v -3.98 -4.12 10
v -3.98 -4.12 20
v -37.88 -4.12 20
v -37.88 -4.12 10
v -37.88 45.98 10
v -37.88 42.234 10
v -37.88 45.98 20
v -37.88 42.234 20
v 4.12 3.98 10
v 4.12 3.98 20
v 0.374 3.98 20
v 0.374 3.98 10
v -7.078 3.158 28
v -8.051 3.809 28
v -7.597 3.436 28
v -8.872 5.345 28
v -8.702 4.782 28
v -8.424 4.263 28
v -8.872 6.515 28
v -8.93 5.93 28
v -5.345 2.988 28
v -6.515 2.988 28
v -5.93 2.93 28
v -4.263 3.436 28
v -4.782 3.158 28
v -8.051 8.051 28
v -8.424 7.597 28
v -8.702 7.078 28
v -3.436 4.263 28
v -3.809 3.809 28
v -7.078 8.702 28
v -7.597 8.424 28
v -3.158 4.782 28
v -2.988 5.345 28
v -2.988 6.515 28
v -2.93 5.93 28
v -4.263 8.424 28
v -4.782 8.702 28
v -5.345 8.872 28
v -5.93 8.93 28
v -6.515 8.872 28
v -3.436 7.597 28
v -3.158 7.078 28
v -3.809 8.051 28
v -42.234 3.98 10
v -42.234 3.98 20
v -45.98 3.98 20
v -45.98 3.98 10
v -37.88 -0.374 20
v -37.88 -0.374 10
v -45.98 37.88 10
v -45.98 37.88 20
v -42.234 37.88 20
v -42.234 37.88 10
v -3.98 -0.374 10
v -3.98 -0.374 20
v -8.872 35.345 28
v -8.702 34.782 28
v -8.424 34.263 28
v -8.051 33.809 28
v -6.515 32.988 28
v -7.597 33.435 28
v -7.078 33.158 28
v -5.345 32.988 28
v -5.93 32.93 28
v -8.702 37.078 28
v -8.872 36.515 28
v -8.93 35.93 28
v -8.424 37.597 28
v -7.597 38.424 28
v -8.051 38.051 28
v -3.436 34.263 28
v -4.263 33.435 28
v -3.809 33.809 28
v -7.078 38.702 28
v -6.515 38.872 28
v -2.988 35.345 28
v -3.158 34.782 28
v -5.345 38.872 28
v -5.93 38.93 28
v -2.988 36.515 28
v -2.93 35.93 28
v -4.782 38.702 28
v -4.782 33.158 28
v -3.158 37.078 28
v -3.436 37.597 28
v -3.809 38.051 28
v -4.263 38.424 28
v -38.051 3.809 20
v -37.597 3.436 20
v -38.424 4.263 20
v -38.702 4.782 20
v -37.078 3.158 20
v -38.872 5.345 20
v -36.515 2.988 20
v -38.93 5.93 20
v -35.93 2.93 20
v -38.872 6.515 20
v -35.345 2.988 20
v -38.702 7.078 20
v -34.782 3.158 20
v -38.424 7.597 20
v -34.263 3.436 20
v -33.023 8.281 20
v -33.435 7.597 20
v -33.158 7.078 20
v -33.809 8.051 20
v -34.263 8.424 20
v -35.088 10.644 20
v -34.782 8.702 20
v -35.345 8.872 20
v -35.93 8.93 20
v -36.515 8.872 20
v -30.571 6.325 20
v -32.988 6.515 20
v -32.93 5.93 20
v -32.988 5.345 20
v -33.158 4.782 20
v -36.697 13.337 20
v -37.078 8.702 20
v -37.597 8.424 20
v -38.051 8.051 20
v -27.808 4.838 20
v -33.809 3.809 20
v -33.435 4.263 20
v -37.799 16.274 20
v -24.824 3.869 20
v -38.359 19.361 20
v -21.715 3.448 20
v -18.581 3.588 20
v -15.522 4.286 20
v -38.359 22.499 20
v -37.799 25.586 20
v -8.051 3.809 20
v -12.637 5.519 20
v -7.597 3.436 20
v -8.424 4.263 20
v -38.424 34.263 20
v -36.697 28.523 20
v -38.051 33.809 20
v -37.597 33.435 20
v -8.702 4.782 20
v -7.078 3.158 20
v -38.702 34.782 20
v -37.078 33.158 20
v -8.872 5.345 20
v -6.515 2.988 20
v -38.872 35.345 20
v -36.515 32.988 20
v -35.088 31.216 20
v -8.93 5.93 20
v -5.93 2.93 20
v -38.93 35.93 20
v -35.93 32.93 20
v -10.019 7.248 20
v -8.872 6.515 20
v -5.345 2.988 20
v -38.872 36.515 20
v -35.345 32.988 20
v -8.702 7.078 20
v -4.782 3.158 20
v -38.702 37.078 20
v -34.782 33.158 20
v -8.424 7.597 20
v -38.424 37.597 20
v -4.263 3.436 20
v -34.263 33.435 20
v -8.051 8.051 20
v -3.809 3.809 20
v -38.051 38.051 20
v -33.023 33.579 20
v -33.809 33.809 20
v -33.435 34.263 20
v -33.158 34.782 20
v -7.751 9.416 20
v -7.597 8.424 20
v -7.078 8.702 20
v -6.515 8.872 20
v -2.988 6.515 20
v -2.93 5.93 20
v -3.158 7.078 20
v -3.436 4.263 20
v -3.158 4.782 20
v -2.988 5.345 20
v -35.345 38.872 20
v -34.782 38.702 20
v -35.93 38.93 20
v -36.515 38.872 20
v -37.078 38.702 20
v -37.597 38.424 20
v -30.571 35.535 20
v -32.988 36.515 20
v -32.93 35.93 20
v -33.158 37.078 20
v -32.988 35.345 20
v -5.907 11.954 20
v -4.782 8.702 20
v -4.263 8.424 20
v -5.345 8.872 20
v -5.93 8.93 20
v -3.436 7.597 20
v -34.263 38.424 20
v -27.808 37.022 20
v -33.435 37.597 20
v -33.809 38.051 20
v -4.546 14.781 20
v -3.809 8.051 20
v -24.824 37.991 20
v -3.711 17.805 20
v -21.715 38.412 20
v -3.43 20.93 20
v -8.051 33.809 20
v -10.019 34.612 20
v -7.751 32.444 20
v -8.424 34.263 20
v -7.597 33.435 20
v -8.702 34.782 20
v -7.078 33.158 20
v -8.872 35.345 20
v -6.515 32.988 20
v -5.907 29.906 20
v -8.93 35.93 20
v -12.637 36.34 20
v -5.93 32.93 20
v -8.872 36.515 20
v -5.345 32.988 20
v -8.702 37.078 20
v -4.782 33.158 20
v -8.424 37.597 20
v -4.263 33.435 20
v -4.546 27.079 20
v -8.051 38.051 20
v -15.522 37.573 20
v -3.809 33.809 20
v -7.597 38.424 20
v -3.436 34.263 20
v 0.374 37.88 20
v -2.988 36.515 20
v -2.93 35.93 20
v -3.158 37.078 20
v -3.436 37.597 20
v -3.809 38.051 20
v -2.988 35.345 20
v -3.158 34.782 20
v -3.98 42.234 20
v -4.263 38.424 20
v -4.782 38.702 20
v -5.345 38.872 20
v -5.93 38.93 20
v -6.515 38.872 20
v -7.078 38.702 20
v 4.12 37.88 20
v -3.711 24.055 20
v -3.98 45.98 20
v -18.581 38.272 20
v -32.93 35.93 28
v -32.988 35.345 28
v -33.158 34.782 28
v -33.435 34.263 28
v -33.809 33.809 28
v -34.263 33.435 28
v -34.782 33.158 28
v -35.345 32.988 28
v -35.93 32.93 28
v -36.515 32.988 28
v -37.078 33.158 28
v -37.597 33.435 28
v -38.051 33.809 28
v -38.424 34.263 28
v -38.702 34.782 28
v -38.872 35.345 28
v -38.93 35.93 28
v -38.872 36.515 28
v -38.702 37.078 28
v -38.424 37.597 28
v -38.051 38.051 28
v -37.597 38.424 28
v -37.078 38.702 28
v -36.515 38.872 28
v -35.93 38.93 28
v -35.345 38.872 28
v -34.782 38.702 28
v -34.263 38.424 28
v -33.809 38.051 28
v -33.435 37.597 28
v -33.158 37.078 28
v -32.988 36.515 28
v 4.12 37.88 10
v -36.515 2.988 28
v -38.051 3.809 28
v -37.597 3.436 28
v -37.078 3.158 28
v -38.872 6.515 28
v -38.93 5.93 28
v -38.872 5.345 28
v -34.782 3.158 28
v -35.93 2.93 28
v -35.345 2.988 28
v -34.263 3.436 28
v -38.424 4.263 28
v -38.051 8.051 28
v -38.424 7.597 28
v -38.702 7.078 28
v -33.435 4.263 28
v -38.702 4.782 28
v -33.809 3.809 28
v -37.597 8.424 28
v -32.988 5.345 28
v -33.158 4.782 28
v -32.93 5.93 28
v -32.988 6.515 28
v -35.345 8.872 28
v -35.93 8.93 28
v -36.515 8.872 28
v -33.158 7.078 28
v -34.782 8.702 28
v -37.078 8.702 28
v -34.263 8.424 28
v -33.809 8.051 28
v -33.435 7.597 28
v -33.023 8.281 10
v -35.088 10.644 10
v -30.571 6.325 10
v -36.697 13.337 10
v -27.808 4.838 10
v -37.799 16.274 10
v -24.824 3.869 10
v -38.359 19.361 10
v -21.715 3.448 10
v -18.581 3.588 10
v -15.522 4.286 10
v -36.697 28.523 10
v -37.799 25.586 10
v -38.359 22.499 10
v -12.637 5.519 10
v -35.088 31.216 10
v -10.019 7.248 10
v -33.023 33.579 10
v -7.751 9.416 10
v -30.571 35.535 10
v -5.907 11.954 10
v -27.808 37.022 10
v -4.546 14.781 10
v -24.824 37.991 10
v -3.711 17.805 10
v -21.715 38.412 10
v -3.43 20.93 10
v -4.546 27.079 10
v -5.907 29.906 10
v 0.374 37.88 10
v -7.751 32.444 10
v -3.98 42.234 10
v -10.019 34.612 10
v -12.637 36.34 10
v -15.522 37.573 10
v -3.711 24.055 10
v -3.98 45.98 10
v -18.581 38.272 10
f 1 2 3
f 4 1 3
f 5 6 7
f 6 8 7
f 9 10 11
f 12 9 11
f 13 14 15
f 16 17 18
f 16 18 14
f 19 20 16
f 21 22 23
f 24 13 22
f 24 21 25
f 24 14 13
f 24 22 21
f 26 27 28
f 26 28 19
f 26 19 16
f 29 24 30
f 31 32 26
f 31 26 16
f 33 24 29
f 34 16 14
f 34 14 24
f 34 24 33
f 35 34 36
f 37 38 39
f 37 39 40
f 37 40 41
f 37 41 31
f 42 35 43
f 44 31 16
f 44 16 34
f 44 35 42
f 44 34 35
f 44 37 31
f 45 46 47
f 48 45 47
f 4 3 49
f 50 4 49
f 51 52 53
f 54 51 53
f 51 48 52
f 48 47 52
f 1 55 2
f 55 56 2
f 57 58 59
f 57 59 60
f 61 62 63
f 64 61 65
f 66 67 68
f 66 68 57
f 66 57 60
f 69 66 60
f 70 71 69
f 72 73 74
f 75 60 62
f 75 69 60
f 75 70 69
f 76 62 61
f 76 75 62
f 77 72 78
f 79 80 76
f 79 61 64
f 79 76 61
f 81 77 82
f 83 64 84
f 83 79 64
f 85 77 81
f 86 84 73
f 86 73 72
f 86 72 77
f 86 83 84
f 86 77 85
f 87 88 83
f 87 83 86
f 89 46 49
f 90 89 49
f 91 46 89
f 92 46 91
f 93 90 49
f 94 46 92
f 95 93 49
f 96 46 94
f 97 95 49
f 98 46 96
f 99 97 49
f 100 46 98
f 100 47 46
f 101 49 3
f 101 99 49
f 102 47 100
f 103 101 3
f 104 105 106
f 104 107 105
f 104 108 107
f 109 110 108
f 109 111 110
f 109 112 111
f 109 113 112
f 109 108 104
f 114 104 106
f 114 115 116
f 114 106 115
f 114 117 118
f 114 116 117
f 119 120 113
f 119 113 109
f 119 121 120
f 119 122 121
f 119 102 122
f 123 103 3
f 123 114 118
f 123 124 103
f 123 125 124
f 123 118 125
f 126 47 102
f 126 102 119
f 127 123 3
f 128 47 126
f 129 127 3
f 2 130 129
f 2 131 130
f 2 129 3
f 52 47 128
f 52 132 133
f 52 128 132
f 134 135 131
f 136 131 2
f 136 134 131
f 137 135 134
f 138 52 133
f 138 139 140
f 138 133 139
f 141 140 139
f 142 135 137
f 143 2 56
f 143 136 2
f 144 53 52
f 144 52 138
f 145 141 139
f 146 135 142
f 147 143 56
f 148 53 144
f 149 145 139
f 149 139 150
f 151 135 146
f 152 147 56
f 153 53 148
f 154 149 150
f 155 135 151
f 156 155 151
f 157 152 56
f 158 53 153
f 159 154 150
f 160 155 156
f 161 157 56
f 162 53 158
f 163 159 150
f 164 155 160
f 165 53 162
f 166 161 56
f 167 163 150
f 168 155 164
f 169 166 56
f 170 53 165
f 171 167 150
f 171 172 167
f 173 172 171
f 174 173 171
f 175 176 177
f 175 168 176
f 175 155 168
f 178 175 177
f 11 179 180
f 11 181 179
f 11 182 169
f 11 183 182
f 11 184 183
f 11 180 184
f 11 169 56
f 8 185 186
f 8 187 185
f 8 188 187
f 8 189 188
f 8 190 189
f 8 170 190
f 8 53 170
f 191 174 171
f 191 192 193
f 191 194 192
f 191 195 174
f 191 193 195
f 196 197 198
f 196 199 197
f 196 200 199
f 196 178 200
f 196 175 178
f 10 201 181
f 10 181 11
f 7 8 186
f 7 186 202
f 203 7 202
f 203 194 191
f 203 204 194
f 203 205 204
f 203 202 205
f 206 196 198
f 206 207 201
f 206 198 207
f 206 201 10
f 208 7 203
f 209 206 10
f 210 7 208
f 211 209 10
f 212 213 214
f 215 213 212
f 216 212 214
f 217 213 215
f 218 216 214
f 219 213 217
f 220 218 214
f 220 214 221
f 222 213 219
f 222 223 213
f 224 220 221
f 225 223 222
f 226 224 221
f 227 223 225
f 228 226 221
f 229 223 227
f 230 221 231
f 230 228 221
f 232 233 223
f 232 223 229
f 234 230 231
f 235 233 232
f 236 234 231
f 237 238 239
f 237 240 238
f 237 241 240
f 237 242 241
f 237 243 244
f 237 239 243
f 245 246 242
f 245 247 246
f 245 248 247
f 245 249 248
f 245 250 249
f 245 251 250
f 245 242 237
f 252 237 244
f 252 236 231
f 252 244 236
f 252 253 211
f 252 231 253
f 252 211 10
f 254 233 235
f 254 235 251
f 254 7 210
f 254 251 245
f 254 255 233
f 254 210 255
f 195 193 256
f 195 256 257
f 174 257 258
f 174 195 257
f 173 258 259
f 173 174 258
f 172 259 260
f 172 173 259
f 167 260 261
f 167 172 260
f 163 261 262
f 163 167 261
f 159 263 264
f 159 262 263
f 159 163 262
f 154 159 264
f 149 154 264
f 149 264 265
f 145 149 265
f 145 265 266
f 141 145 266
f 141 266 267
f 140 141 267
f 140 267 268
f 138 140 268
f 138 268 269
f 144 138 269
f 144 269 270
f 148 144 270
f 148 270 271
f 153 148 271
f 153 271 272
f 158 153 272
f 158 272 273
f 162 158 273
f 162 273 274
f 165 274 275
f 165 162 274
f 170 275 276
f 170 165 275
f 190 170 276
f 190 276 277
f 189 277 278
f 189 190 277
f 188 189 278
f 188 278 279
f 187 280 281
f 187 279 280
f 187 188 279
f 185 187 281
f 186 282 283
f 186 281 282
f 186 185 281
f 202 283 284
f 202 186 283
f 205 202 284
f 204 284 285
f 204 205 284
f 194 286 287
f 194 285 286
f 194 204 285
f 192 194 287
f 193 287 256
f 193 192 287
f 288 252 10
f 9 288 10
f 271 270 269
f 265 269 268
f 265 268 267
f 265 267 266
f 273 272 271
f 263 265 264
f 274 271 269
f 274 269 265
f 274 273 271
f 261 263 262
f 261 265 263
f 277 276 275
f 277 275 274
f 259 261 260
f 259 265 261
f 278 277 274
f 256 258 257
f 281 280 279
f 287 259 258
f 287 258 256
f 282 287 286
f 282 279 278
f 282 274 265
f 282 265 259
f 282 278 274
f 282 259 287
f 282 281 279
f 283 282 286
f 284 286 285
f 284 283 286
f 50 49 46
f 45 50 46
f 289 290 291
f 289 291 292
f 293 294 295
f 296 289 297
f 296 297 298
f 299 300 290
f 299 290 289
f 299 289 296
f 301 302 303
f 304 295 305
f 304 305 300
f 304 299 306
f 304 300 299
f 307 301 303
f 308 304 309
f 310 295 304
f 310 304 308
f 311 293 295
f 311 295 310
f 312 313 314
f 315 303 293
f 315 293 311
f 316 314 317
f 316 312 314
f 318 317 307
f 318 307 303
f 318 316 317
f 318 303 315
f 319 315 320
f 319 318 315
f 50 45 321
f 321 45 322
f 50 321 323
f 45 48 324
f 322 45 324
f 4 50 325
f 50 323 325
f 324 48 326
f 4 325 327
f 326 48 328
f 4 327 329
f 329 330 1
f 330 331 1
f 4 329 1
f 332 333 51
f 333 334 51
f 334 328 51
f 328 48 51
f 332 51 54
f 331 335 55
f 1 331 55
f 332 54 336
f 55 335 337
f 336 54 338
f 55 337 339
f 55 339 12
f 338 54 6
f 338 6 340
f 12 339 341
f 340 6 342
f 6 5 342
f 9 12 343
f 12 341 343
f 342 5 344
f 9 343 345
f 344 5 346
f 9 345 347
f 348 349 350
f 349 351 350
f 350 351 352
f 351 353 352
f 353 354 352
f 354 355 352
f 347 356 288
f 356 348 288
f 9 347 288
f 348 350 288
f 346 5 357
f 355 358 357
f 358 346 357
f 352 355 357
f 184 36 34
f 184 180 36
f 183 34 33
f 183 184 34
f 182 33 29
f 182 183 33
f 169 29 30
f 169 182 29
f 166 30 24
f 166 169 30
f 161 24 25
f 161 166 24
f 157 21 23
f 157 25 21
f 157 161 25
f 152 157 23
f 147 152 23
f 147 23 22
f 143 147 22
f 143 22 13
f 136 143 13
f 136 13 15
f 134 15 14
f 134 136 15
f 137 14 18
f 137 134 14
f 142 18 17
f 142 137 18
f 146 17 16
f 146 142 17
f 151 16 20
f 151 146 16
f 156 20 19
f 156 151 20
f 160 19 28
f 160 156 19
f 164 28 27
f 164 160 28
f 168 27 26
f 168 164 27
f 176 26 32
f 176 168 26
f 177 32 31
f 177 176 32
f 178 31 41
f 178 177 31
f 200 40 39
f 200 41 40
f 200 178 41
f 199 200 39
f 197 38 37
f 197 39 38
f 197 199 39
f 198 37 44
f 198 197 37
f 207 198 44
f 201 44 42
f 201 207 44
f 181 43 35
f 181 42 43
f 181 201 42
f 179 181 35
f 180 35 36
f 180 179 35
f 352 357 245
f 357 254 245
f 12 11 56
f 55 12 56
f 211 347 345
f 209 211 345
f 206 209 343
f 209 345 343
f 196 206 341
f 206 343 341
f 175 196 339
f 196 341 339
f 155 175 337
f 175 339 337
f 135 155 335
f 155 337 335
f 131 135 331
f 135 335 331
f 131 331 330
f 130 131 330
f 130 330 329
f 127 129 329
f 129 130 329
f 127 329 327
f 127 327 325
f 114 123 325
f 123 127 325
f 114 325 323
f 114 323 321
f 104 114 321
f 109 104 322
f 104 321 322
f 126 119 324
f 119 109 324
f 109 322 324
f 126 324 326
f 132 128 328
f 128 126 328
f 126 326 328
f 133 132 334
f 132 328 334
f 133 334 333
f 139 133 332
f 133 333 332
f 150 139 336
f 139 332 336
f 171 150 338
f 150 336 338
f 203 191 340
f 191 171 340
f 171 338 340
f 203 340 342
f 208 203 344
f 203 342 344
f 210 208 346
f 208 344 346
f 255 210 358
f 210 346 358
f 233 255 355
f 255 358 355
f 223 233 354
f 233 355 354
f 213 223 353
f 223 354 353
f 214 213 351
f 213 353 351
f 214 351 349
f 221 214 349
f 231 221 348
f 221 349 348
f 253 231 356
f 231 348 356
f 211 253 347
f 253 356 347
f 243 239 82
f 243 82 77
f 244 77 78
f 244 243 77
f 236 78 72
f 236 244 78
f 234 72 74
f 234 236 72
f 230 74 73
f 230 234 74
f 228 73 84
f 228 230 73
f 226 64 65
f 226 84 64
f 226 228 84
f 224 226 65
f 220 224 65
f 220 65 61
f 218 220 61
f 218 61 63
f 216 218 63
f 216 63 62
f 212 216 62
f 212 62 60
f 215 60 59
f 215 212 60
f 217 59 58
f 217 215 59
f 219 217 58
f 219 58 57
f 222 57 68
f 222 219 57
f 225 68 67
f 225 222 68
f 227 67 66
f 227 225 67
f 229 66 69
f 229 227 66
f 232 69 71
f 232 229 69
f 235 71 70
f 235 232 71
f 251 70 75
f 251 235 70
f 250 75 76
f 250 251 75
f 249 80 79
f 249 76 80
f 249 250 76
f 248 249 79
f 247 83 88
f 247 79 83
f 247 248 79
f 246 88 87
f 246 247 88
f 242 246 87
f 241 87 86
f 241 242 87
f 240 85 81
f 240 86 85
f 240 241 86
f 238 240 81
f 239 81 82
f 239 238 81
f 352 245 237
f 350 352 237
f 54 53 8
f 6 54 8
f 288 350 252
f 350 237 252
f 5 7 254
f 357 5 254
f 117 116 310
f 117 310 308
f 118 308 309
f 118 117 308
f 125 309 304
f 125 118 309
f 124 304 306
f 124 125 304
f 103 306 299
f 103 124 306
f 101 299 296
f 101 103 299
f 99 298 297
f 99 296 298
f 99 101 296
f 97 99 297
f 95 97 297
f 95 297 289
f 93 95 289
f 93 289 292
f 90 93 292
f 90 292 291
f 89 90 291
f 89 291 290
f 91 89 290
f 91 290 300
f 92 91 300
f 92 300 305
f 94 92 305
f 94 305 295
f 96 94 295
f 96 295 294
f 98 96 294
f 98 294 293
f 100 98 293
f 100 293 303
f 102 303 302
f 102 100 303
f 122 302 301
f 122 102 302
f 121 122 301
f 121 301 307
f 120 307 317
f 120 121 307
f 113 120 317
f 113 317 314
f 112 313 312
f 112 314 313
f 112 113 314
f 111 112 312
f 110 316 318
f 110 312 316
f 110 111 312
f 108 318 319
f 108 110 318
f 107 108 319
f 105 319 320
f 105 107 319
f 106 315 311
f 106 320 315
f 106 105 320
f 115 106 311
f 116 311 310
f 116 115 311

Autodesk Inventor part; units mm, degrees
ref_plane "YZ Plane" through (0, 0, 0) normal (1, 0, 0) x (0, 1, 0)
ref_plane "XZ Plane" through (0, 0, 0) normal (0, 1, 0) x (-1, 0, 0)
ref_plane "Work Plane1" through (0, 0, 10) normal (0, 0, 1) x (1, 0, 0)
sketch "Sketch1" plane through (0, 0, 10) normal (0, 0, 1) x (1, 0, 0)
  line L0 (-4.0299, -0.3538) -> (-2.2322, 1.4439) construction
  arc A0 (-1.4439, 2.2322) -> (-2.2322, 1.4439) centre (-0.9299, 0.9299) ccw construction
  line L1 (-1.4439, 2.2322) -> (0.3538, 4.0299) construction
  line L2 (-37.8299, 42.8299) -> (-37.8299, 37.8299) construction
  line L3 (-37.8299, 37.8299) -> (-42.9208, 37.8299) construction
  line L4 (-37.8299, 42.2137) -> (-37.8299, 45.8299) construction
  line L5 (-37.8299, 45.8299) -> (-4.0299, 45.8299) construction
  line L6 (-4.0299, 45.8299) -> (-4.0299, 42.2137) construction
  line L7 (-4.0299, 4.0299) -> (0.3538, 4.0299) projected
  circle A1 centre (-20.9299, 20.9299) radius 17.5 projected
  line L8 (-20.9299, 58.9723) -> (17.1124, 20.9299) construction
  line L9 (17.1124, 20.9299) -> (-20.9299, -17.1124) construction
  line L10 (-20.9299, -17.1124) -> (-58.9723, 20.9299) construction
  line L11 (-58.9723, 20.9299) -> (-20.9299, 58.9723) construction
  line L12 (-20.9299, 58.9723) -> (-20.9299, -17.1124) construction
  line L13 (17.1124, 20.9299) -> (-58.9723, 20.9299) construction
  line L14 (-20.9299, 58.9723) -> (32.8701, 58.9723) construction
  line L15 (-43.4299, 43.4299) -> (1.5701, 43.4299) construction
  line L16 (1.5701, 43.4299) -> (1.5701, -1.5701) construction
  line L17 (1.5701, -1.5701) -> (-43.4299, -1.5701) construction
  line L18 (-43.4299, -1.5701) -> (-43.4299, 43.4299) construction
  line L19 (-43.4299, 43.4299) -> (1.5701, -1.5701) construction
  line L20 (1.5701, 43.4299) -> (-43.4299, -1.5701) construction
  line L21 (-43.4299, 5.3876) -> (-43.4299, 36.4723)
  line L22 (-43.4299, 36.4723) -> (-36.4723, 43.4299)
  line L23 (-36.4723, 43.4299) -> (-5.3876, 43.4299)
  line L24 (-5.3876, 43.4299) -> (1.5701, 36.4723)
  line L25 (1.5701, 36.4723) -> (1.5701, 5.3876)
  line L26 (1.5701, 5.3876) -> (-5.3876, -1.5701)
  line L27 (-5.3876, -1.5701) -> (-36.4723, -1.5701)
  line L28 (-36.4723, -1.5701) -> (-43.4299, 5.3876)
  line L29 (-4.0299, 42.2137) -> (-37.8299, 42.2137) projected
  line L30 (-4.0299, -0.3538) -> (-4.0299, 4.0299) projected
  point P0 (-37.8299, 4.0299)
  point P1 (-20.9299, 20.9299)
  dimension "d18" = 53.8
  dimension "d19" = 45
  dimension "d20" = 53.8
  dimension "d21" = 45
  dimension "d22" = 45
extrude "Extrusion1" add sketch "Sketch1" along normal blind 10
sketch "Sketch2" plane through (0, 0, 20) normal (0, 0, 1) x (1, 0, 0)
  circle A0 centre (-35.9299, 35.9299) radius 3.0099 construction
  circle A1 centre (-5.93, 35.9299) radius 3.0099 construction
  circle A2 centre (-5.93, 5.93) radius 3.0099 construction
  circle A3 centre (-35.9299, 5.93) radius 3.0099 construction
  circle A4 centre (-35.9299, 35.9299) radius 3
  circle A5 centre (-5.93, 35.9299) radius 3
  circle A6 centre (-5.93, 5.93) radius 3
  circle A7 centre (-35.9299, 5.93) radius 3
  point P0 (0, 0)
  dimension "d1" = 6
  dimension "d31" = 6
  dimension "d32" = 6
  dimension "d33" = 6
ref_plane "Work Plane2" through (-40.9959, 0.8639, 22.2359) normal (0, 0, 1) x (1, 0, 0)
extrude "Extrusion2" add sketch "Sketch2" along normal blind 8
sketch "Sketch3" plane through (0, 0, 10) normal (0, 0, -1) x (-1, 0, 0)
  line L0 (37.8299, -0.4701) -> (37.8299, 4.0299) construction
  line L1 (4.0299, 4.0299) -> (4.0299, -0.4701) construction
  line L2 (37.8299, -0.4701) -> (37.8299, 1.1886) construction
  line L3 (4.0299, -3.9701) -> (4.0299, -0.3538) construction
  line L4 (45.8299, 4.0299) -> (42.2137, 4.0299) construction
  line L5 (-0.3538, 4.0299) -> (-3.9701, 4.0299) construction
  line L6 (-3.9701, 37.8299) -> (-0.3538, 37.8299) construction
  line L7 (4.0299, 42.2137) -> (4.0299, 45.8299) construction
  line L8 (37.8299, 45.8299) -> (37.8299, 42.2137) construction
  line L9 (42.2137, 37.8299) -> (45.8299, 37.8299) construction
  line L10 (40.4657, 37.7299) -> (45.8299, 37.7299)
  line L11 (45.8299, 37.7299) -> (45.8299, 4.1299)
  line L12 (45.8299, 4.1299) -> (40.4657, 4.1299)
  line L13 (40.4657, 4.1299) -> (40.4657, 37.7299)
  line L14 (37.7299, 2.4952) -> (4.1299, 2.4952)
  line L15 (4.1299, 2.4952) -> (4.1299, -3.9701)
  line L16 (4.1299, -3.9701) -> (37.7299, -3.9701)
  line L17 (37.7299, -3.9701) -> (37.7299, 2.4952)
  line L18 (1.8946, 4.1299) -> (-3.9701, 4.1299)
  line L19 (-3.9701, 4.1299) -> (-3.9701, 37.7299)
  line L20 (-3.9701, 37.7299) -> (1.8946, 37.7299)
  line L21 (1.8946, 37.7299) -> (1.8946, 4.1299)
  line L22 (4.1299, 40.7326) -> (37.7299, 40.7326)
  line L23 (37.7299, 40.7326) -> (37.7299, 45.8299)
  line L24 (37.7299, 45.8299) -> (4.1299, 45.8299)
  line L25 (4.1299, 45.8299) -> (4.1299, 40.7326)
  point P0 (0, 0)
  dimension "d23" = 0.1
  dimension "d24" = 0.1
  dimension "d25" = 0.1
  dimension "d26" = 0.1
  dimension "d27" = 0.1
extrude "Extrusion3" add sketch "Sketch3" against normal up to surface (10 mm away)
sketch "Sketch4" plane through (0, 0, 20) normal (0, 0, 1) x (1, 0, 0)
  line L0 (3.9701, 4.1299) -> (0.3124, 4.1299) projected
  line L1 (3.9701, 37.7299) -> (3.9701, 4.1299) projected
  line L2 (0.3124, 37.7299) -> (3.9701, 37.7299) projected
  line L3 (0.3124, 37.7299) -> (-4.1299, 42.1723) projected
  line L4 (-4.1299, 45.8299) -> (-4.1299, 42.1723) projected
  line L5 (-37.7299, 45.8299) -> (-4.1299, 45.8299) projected
  line L6 (-37.7299, 42.1723) -> (-37.7299, 45.8299) projected
  line L7 (-37.7299, 42.1723) -> (-42.1723, 37.7299) projected
  line L8 (-45.8299, 37.7299) -> (-42.1723, 37.7299) projected
  line L9 (-45.8299, 4.1299) -> (-45.8299, 37.7299) projected
  line L10 (-42.1723, 4.1299) -> (-45.8299, 4.1299) projected
  line L11 (-42.1723, 4.1299) -> (-37.7299, -0.3124) projected
  line L12 (-37.7299, -3.9701) -> (-37.7299, -0.3124) projected
  line L13 (-4.1299, -3.9701) -> (-37.7299, -3.9701) projected
  line L14 (-4.1299, -0.3124) -> (-4.1299, -3.9701) projected
  line L15 (-4.1299, -0.3124) -> (0.3124, 4.1299) projected
  circle A0 centre (-20.9299, 20.9299) radius 17.5 projected
  circle A1 centre (-35.9299, 5.93) radius 3 projected
  circle A2 centre (-5.93, 35.9299) radius 3 projected
  circle A3 centre (-35.9299, 35.9299) radius 3 projected
  circle A4 centre (-5.93, 5.93) radius 3 projected
  line L16 (-3.9799, 45.9799) -> (-3.9799, 42.2344)
  line L17 (-3.9799, 42.2344) -> (0.3745, 37.8799)
  line L18 (0.3745, 37.8799) -> (4.1201, 37.8799)
  line L19 (4.1201, 37.8799) -> (4.1201, 3.9799)
  line L20 (4.1201, 3.9799) -> (0.3745, 3.9799)
  line L21 (0.3745, 3.9799) -> (-3.9799, -0.3745)
  line L22 (-3.9799, -0.3745) -> (-3.9799, -4.1201)
  line L23 (-3.9799, -4.1201) -> (-37.8799, -4.1201)
  line L24 (-37.8799, -4.1201) -> (-37.8799, -0.3745)
  line L25 (-37.8799, -0.3745) -> (-42.2344, 3.9799)
  line L26 (-42.2344, 3.9799) -> (-45.9799, 3.9799)
  line L27 (-45.9799, 3.9799) -> (-45.9799, 37.8799)
  line L28 (-45.9799, 37.8799) -> (-42.2344, 37.8799)
  line L29 (-42.2344, 37.8799) -> (-37.8799, 42.2344)
  line L30 (-37.8799, 42.2344) -> (-37.8799, 45.9799)
  line L31 (-37.8799, 45.9799) -> (-3.9799, 45.9799)
  point P0 (0, 0)
  dimension "d34" = 0.15
extrude "Extrusion4" add sketch "Sketch4" against normal up to surface (10 mm away) contours L16 L17 L18 L19 L20 L21 L22 L23 L24 L25 L26 L27 L28 L29 L30 L31
ref_plane "Arbeitsebene3" through (-37.8799, 20.9299, 20) normal (0, -1, 0) x (1, 0, 0)
ref_plane "Arbeitsebene4" through (-20.9299, 3.9799, 20) normal (1, 0, 0) x (0, 0, -1)
equation "\"d31\" = d1"
equation "\"d32\" = d1"
equation "\"d33\" = d1"
properties part number "20_Cube_Insert_Thorlabs_Pins"
